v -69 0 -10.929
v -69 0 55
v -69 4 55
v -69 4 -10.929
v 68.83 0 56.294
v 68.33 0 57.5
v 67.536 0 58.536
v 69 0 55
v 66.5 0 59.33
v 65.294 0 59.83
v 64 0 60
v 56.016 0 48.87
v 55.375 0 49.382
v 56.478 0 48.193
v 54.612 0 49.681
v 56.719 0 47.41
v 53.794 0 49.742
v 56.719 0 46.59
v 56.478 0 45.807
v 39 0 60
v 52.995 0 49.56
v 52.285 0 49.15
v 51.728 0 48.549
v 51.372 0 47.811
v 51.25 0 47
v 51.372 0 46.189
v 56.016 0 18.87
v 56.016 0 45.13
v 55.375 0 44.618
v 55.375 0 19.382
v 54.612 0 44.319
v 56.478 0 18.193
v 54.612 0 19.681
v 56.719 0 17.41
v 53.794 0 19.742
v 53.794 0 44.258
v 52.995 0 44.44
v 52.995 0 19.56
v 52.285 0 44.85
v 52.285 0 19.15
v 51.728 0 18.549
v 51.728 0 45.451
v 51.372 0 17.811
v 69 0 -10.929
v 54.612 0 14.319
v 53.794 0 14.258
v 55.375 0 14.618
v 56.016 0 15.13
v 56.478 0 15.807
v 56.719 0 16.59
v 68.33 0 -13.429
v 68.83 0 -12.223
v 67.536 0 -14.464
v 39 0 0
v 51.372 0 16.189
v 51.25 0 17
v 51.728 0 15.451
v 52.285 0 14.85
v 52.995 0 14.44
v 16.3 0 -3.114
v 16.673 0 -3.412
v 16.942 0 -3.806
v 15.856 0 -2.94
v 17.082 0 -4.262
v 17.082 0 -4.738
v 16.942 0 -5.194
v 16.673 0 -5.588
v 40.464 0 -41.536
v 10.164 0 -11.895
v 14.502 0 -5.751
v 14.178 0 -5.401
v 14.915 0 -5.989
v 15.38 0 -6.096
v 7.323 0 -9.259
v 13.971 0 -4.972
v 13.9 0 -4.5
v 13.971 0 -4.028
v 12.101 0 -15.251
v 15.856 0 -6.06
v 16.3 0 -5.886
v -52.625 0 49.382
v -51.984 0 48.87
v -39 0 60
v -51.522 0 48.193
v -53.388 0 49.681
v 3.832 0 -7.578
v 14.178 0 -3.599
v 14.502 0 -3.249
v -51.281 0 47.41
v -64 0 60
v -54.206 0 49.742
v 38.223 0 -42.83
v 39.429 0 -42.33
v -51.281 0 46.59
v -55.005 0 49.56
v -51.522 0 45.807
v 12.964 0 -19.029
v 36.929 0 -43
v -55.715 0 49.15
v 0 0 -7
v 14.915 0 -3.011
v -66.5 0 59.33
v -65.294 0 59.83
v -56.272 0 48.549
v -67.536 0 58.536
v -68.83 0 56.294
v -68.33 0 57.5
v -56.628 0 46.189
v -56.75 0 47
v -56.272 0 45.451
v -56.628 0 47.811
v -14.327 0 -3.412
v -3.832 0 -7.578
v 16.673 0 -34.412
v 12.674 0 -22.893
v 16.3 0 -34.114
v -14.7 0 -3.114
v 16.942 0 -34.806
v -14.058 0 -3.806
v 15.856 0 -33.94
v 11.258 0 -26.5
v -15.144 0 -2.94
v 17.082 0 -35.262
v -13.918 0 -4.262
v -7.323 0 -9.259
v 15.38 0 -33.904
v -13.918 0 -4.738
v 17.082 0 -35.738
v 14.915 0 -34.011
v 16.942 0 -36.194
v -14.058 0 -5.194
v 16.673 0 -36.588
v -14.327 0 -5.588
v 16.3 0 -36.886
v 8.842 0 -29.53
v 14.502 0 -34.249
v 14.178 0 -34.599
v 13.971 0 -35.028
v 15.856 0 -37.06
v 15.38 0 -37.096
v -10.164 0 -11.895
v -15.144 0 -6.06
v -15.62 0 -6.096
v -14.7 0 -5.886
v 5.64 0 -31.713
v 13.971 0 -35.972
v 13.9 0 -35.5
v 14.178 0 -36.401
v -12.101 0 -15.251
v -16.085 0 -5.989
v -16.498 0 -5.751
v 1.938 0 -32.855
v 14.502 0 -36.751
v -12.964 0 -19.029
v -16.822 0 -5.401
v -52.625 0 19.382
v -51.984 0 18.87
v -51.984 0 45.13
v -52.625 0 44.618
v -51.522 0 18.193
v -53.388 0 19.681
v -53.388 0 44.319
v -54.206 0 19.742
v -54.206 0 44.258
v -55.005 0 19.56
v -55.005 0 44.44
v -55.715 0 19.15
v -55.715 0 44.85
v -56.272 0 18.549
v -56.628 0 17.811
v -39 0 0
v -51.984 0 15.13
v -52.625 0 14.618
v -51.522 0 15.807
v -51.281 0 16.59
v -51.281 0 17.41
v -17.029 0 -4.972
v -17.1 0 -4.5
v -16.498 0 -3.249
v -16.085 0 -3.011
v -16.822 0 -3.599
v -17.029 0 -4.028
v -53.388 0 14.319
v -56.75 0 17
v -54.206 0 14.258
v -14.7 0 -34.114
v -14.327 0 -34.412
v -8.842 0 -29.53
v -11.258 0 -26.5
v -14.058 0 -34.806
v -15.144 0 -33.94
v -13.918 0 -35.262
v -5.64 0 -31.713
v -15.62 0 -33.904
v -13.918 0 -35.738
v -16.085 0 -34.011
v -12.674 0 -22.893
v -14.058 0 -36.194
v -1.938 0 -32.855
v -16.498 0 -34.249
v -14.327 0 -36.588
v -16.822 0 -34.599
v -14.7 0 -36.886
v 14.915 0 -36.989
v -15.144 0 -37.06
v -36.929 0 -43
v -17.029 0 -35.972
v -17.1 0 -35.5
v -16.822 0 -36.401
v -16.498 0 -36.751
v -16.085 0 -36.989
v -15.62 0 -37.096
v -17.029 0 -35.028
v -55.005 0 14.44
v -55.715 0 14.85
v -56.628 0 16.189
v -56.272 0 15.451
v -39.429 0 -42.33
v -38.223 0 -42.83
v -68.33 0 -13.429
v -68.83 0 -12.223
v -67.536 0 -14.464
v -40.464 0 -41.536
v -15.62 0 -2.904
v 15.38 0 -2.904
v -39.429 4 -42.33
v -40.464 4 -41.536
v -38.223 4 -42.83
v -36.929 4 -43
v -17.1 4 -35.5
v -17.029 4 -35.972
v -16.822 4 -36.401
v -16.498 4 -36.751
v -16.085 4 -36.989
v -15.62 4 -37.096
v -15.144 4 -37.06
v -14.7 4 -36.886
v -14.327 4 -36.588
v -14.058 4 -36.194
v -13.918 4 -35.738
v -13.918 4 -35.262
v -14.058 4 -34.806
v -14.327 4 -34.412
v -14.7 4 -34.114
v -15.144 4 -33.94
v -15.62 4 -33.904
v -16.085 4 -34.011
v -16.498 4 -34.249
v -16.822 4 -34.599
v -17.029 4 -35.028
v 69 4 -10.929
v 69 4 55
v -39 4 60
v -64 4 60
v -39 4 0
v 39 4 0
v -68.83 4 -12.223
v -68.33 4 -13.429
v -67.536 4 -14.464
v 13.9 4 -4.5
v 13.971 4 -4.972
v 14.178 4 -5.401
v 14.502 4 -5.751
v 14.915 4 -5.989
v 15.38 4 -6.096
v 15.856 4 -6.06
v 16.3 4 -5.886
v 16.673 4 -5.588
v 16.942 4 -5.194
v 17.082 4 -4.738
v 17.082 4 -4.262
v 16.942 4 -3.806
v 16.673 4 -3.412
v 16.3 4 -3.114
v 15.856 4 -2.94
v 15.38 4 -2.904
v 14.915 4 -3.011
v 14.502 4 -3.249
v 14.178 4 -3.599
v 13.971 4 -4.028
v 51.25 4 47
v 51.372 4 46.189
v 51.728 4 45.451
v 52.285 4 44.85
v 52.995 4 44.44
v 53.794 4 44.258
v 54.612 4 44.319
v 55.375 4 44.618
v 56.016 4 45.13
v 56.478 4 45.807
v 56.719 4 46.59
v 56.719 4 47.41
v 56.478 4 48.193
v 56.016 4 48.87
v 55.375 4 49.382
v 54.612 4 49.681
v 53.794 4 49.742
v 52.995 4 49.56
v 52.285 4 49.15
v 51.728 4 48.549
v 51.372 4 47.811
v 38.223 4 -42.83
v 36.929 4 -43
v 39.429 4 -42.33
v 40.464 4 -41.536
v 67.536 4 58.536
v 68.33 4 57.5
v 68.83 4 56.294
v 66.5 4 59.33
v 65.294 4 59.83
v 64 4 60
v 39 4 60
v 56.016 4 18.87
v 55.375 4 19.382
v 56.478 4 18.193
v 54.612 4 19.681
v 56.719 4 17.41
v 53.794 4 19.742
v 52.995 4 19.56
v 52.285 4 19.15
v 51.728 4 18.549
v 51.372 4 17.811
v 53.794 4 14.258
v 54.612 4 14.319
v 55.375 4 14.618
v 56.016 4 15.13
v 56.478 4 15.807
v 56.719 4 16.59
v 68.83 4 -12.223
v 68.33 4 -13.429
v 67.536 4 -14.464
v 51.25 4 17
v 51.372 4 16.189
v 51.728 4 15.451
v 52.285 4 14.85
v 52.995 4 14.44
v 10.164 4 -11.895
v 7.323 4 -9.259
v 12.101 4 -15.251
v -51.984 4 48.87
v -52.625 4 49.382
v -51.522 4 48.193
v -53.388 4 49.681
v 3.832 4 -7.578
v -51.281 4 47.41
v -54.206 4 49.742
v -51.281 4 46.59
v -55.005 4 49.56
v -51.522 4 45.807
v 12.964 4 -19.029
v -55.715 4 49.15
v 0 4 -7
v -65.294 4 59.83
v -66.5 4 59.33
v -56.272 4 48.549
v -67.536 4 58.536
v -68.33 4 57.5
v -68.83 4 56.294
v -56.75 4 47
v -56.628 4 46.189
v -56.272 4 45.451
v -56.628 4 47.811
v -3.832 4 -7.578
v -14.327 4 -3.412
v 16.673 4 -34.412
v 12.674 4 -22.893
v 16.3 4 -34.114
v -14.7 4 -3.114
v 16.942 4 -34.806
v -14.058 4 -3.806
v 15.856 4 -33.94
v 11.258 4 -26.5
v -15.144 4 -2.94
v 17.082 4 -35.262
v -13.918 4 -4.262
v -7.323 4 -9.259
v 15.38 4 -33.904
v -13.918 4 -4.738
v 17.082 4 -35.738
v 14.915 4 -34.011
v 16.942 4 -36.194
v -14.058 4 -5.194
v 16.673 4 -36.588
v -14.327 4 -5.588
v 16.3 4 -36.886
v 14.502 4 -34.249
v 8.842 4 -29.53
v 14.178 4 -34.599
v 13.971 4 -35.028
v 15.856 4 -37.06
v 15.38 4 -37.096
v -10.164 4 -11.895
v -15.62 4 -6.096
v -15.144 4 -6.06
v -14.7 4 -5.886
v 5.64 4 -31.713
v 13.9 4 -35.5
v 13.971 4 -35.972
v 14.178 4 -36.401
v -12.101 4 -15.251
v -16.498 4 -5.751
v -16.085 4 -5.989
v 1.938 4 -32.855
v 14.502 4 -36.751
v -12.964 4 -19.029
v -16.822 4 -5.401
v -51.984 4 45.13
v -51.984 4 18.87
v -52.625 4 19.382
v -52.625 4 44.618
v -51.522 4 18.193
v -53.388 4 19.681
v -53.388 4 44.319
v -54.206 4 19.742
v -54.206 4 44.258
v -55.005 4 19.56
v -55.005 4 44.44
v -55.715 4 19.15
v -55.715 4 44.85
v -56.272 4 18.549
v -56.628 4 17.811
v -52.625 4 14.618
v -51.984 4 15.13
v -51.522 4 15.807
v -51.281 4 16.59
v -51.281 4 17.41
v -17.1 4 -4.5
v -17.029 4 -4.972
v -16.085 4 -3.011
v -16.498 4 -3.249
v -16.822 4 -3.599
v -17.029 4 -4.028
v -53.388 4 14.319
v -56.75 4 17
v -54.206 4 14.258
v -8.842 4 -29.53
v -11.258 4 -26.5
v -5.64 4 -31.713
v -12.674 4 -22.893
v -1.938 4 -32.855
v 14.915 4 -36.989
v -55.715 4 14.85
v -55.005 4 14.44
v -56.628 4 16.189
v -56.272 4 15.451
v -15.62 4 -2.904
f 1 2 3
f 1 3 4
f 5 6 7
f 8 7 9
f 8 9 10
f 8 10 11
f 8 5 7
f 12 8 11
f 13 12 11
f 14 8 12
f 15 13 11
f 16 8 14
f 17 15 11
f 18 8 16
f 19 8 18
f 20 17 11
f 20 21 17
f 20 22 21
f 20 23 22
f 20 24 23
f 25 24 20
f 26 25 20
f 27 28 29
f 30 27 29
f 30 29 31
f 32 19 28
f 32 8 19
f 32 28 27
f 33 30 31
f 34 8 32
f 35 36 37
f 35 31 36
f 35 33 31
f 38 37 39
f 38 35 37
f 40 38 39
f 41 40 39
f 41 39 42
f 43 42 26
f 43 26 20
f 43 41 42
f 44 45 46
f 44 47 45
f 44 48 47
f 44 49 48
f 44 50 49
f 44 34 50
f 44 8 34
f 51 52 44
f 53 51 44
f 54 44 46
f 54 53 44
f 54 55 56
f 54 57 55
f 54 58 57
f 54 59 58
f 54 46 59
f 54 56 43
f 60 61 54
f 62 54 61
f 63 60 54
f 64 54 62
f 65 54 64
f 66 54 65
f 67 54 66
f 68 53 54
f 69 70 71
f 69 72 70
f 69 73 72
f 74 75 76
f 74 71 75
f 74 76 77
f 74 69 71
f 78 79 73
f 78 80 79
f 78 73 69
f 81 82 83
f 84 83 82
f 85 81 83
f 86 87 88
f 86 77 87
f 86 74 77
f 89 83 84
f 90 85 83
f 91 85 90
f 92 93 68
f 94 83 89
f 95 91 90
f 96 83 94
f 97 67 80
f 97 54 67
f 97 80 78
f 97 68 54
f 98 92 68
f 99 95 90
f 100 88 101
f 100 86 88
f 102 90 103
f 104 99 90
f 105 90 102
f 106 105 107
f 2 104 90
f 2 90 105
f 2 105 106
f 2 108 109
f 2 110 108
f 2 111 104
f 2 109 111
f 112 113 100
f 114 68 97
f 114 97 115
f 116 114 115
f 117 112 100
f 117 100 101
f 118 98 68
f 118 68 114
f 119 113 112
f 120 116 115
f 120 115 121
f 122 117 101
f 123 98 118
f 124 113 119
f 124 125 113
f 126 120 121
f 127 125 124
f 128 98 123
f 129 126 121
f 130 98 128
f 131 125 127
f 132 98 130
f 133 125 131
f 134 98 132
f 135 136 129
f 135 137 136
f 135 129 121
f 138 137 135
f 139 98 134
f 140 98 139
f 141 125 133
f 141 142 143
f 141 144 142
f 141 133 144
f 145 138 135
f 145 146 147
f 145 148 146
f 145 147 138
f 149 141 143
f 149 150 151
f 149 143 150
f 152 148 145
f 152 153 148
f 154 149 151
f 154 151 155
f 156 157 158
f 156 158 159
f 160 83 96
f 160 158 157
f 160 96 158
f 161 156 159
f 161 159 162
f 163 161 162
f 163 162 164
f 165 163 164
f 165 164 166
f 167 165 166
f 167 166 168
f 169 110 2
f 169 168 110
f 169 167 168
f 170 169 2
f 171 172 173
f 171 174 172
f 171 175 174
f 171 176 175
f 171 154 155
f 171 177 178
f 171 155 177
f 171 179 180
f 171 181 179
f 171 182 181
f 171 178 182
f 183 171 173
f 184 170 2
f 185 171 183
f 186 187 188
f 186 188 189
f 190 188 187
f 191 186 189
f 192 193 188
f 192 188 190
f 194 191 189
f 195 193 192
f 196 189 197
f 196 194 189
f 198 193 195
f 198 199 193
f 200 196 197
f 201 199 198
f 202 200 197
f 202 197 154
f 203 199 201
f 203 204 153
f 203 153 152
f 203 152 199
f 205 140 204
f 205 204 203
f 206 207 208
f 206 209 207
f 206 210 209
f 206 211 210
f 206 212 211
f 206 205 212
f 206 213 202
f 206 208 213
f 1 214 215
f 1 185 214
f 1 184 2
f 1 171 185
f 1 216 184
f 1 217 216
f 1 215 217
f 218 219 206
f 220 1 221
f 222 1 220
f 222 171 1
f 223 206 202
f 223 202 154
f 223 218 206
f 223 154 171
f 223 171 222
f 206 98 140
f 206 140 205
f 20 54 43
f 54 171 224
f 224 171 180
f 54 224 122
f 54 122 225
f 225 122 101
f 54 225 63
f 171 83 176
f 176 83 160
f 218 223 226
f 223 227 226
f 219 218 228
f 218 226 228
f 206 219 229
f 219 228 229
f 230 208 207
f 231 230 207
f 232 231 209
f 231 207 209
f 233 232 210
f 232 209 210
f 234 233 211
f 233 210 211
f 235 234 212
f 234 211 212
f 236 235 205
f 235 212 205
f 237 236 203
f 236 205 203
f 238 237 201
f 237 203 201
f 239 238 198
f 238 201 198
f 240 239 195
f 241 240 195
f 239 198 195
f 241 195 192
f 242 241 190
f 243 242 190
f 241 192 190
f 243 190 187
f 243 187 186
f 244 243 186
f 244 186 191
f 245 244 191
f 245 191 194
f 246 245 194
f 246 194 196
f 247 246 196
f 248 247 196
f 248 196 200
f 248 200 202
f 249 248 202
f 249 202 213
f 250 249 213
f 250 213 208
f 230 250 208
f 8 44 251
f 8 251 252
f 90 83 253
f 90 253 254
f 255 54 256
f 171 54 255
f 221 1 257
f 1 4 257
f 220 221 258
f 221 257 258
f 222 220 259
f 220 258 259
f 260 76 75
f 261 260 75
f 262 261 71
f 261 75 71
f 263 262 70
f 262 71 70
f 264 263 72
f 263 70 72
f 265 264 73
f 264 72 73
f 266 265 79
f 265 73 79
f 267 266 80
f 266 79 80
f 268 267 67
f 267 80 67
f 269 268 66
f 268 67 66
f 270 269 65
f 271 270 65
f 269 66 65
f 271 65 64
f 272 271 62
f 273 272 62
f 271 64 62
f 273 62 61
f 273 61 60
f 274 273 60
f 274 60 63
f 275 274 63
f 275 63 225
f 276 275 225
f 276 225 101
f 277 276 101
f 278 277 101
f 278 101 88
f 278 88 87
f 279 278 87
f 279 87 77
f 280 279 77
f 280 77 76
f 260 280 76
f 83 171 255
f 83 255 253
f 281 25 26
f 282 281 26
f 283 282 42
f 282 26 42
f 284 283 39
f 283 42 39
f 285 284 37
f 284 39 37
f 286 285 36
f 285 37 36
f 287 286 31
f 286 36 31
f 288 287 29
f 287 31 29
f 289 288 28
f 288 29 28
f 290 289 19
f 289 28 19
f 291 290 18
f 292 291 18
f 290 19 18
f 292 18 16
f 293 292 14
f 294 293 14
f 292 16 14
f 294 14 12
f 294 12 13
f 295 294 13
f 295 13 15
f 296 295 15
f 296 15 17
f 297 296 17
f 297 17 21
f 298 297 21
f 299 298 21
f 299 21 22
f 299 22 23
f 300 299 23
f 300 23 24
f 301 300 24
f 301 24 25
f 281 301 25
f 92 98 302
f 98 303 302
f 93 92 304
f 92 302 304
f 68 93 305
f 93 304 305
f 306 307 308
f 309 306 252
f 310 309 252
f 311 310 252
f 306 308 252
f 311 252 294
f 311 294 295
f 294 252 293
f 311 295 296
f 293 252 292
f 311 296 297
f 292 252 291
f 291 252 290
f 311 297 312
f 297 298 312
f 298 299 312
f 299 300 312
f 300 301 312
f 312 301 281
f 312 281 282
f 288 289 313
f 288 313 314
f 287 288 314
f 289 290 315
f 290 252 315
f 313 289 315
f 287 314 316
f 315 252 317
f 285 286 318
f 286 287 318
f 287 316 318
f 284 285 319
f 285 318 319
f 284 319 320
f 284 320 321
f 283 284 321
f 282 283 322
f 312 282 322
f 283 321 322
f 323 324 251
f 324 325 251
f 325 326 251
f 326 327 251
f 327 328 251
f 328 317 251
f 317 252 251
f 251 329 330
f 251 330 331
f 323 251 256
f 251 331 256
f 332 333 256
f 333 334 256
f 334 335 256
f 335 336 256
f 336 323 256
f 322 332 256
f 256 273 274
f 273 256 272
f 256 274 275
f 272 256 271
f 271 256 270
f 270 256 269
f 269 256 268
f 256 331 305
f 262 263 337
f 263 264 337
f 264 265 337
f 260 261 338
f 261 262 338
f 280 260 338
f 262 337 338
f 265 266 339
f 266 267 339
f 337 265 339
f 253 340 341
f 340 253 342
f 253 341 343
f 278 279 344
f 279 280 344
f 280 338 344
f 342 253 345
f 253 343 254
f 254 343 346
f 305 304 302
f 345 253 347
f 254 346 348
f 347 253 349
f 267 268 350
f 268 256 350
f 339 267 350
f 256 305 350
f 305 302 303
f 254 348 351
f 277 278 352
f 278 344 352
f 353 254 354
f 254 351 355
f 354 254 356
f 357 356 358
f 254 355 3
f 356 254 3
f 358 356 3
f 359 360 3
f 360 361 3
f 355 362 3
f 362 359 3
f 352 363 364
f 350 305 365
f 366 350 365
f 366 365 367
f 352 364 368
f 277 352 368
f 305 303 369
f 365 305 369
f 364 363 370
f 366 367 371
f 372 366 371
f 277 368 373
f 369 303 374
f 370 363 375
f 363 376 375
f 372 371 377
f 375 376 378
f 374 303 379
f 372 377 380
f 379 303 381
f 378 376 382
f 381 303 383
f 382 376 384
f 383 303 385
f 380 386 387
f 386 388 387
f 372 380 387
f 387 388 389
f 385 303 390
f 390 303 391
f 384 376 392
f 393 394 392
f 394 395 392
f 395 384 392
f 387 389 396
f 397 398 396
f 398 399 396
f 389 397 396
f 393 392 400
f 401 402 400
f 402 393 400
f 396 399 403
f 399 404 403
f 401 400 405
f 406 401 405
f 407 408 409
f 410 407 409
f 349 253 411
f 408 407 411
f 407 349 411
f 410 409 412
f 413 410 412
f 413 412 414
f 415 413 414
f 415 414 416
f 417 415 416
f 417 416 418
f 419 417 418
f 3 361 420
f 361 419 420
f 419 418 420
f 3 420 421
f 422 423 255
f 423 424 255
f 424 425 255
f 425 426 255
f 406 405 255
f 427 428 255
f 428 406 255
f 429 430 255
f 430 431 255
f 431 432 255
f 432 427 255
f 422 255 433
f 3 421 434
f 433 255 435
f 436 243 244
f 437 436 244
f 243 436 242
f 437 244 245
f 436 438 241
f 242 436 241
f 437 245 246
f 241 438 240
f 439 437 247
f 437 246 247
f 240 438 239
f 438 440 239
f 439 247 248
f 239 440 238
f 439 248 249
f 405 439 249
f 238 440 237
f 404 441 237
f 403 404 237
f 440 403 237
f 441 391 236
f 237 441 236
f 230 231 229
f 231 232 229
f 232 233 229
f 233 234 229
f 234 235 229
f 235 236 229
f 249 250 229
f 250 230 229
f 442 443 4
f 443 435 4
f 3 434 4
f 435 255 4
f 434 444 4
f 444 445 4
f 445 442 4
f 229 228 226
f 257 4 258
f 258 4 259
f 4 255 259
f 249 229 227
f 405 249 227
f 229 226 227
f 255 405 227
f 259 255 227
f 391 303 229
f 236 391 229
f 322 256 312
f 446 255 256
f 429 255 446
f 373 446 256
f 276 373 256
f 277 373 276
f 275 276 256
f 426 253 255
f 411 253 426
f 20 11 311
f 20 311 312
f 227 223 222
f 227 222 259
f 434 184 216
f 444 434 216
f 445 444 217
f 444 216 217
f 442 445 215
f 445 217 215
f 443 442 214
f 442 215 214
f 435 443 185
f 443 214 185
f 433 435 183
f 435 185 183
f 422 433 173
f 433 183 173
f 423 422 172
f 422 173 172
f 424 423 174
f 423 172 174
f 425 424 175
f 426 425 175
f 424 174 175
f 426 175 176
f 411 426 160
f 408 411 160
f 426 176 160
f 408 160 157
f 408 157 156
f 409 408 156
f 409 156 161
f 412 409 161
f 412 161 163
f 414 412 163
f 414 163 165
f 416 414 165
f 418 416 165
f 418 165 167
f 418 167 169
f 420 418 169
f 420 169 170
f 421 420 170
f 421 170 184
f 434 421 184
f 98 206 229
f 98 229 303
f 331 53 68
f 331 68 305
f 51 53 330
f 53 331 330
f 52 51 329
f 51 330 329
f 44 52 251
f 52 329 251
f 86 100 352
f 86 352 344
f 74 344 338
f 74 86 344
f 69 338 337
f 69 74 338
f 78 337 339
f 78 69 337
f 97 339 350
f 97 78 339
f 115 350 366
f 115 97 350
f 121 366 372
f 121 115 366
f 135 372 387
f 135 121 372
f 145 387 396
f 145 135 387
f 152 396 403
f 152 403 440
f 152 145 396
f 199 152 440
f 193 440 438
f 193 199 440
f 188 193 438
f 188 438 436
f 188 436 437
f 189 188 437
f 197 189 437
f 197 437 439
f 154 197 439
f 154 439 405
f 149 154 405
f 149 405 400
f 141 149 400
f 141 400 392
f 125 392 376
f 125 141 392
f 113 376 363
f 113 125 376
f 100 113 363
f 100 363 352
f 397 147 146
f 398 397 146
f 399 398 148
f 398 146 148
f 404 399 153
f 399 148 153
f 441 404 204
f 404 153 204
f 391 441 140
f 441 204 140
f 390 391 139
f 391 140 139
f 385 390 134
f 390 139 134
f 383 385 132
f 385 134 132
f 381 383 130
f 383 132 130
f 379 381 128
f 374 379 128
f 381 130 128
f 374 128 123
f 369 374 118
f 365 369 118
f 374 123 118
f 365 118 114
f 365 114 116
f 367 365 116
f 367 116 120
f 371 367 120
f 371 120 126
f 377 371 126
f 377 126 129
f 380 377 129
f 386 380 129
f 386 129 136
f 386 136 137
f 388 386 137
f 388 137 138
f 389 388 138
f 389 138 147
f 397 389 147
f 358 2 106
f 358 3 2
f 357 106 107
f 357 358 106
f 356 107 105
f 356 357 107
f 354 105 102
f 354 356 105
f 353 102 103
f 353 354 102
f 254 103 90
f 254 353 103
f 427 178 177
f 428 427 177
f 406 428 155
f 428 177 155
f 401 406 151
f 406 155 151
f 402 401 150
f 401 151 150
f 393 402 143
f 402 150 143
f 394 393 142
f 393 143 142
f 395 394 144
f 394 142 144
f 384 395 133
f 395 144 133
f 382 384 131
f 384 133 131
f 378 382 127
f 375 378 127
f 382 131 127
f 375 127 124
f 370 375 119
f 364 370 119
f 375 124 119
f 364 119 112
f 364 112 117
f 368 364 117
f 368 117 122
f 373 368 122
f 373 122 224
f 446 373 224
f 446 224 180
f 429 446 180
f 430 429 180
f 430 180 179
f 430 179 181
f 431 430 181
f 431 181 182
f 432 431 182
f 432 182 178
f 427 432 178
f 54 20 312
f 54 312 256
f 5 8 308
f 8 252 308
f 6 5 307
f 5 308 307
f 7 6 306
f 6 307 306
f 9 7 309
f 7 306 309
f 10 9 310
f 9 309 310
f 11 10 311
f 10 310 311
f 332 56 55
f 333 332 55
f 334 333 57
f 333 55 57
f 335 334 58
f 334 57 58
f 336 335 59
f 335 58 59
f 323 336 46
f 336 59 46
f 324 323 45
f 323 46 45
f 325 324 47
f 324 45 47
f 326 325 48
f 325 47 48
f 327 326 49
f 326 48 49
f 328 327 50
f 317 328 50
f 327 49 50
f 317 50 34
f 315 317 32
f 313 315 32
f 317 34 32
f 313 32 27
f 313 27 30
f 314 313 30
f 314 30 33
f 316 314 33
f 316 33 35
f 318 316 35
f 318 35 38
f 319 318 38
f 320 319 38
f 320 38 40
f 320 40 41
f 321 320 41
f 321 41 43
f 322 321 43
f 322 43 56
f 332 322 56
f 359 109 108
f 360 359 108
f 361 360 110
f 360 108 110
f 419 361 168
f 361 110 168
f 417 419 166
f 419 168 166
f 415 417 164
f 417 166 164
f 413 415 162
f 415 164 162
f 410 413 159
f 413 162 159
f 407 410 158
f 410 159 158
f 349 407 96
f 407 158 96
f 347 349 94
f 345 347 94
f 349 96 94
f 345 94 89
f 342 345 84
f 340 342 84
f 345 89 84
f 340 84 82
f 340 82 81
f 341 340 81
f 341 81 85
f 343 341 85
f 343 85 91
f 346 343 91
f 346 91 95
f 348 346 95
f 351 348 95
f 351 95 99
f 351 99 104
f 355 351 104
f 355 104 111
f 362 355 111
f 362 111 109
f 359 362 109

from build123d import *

# Parameters (mm, degrees)
SKETCH1_R                = 13
BOSS_EXTRUDE1_DEPTH      = 4
CHAMFER1_SIZE            = 30
M3_CLEARANCE_HOLE1_D     = 3.2
M3_CLEARANCE_HOLE1_DEPTH = 8
M3_CLEARANCE_HOLE1_TIP   = 0.96137699
FILLET1_R                = 5
M5_CLEARANCE_HOLE1_D     = 5.5
M5_CLEARANCE_HOLE1_DEPTH = 8
M5_CLEARANCE_HOLE1_TIP   = 1.652366702


with BuildPart() as part:
    # Sketch1 → Boss-Extrude1 (new body)
    with BuildSketch(Plane(origin=(0, 0, 0), x_dir=(1, 0, 0), z_dir=(0, 1, 0))):
        Polygon((-69, -60), (-69, 43), (69, 43), (69, -60), (39, -60), (39, 0), (-39, 0), (-39, -60), align=None)
        with Locations(Location((0, 20, 0), (0, 0, 270))):
            Circle(SKETCH1_R, mode=Mode.SUBTRACT)
    extrude(amount=BOSS_EXTRUDE1_DEPTH)

    # Chamfer1
    chamfer1_edges = [part.edges().sort_by_distance(p)[0] for p in [
        (-69, 2, -43),
        (69, 2, -43),
    ]]
    chamfer(chamfer1_edges, length=CHAMFER1_SIZE)

    # M3 Clearance Hole1
    with Locations(Plane(origin=(0, 4, 0), x_dir=(1, 0, 0), z_dir=(0, 1, 0))):
        with Locations((-15.5, 35.5), (-15.5, 4.5), (15.5, 4.5), (15.5, 35.5)):
            Hole(M3_CLEARANCE_HOLE1_D / 2, depth=M3_CLEARANCE_HOLE1_DEPTH)
            with Locations((0, 0, -(M3_CLEARANCE_HOLE1_DEPTH + M3_CLEARANCE_HOLE1_TIP / 2))):  # 118° drill point
                Cone(0, M3_CLEARANCE_HOLE1_D / 2, M3_CLEARANCE_HOLE1_TIP, mode=Mode.SUBTRACT)

    # Fillet1
    fillet1_edges = [part.edges().sort_by_distance(p)[0] for p in [
        (-69, 2, 60),
        (69, 2, 60),
        (-69, 2, -13),
        (39, 2, -43),
        (-39, 2, -43),
        (69, 2, -13),
    ]]
    fillet(fillet1_edges, radius=FILLET1_R)

    # M5 Clearance Hole1
    with Locations(Plane(origin=(0, 4, 0), x_dir=(1, 0, 0), z_dir=(0, 1, 0))):
        with Locations((-54, -47), (-54, -17), (54, -17), (54, -47)):
            Hole(M5_CLEARANCE_HOLE1_D / 2, depth=M5_CLEARANCE_HOLE1_DEPTH)
            with Locations((0, 0, -(M5_CLEARANCE_HOLE1_DEPTH + M5_CLEARANCE_HOLE1_TIP / 2))):  # 118° drill point
                Cone(0, M5_CLEARANCE_HOLE1_D / 2, M5_CLEARANCE_HOLE1_TIP, mode=Mode.SUBTRACT)


solid = part.part
